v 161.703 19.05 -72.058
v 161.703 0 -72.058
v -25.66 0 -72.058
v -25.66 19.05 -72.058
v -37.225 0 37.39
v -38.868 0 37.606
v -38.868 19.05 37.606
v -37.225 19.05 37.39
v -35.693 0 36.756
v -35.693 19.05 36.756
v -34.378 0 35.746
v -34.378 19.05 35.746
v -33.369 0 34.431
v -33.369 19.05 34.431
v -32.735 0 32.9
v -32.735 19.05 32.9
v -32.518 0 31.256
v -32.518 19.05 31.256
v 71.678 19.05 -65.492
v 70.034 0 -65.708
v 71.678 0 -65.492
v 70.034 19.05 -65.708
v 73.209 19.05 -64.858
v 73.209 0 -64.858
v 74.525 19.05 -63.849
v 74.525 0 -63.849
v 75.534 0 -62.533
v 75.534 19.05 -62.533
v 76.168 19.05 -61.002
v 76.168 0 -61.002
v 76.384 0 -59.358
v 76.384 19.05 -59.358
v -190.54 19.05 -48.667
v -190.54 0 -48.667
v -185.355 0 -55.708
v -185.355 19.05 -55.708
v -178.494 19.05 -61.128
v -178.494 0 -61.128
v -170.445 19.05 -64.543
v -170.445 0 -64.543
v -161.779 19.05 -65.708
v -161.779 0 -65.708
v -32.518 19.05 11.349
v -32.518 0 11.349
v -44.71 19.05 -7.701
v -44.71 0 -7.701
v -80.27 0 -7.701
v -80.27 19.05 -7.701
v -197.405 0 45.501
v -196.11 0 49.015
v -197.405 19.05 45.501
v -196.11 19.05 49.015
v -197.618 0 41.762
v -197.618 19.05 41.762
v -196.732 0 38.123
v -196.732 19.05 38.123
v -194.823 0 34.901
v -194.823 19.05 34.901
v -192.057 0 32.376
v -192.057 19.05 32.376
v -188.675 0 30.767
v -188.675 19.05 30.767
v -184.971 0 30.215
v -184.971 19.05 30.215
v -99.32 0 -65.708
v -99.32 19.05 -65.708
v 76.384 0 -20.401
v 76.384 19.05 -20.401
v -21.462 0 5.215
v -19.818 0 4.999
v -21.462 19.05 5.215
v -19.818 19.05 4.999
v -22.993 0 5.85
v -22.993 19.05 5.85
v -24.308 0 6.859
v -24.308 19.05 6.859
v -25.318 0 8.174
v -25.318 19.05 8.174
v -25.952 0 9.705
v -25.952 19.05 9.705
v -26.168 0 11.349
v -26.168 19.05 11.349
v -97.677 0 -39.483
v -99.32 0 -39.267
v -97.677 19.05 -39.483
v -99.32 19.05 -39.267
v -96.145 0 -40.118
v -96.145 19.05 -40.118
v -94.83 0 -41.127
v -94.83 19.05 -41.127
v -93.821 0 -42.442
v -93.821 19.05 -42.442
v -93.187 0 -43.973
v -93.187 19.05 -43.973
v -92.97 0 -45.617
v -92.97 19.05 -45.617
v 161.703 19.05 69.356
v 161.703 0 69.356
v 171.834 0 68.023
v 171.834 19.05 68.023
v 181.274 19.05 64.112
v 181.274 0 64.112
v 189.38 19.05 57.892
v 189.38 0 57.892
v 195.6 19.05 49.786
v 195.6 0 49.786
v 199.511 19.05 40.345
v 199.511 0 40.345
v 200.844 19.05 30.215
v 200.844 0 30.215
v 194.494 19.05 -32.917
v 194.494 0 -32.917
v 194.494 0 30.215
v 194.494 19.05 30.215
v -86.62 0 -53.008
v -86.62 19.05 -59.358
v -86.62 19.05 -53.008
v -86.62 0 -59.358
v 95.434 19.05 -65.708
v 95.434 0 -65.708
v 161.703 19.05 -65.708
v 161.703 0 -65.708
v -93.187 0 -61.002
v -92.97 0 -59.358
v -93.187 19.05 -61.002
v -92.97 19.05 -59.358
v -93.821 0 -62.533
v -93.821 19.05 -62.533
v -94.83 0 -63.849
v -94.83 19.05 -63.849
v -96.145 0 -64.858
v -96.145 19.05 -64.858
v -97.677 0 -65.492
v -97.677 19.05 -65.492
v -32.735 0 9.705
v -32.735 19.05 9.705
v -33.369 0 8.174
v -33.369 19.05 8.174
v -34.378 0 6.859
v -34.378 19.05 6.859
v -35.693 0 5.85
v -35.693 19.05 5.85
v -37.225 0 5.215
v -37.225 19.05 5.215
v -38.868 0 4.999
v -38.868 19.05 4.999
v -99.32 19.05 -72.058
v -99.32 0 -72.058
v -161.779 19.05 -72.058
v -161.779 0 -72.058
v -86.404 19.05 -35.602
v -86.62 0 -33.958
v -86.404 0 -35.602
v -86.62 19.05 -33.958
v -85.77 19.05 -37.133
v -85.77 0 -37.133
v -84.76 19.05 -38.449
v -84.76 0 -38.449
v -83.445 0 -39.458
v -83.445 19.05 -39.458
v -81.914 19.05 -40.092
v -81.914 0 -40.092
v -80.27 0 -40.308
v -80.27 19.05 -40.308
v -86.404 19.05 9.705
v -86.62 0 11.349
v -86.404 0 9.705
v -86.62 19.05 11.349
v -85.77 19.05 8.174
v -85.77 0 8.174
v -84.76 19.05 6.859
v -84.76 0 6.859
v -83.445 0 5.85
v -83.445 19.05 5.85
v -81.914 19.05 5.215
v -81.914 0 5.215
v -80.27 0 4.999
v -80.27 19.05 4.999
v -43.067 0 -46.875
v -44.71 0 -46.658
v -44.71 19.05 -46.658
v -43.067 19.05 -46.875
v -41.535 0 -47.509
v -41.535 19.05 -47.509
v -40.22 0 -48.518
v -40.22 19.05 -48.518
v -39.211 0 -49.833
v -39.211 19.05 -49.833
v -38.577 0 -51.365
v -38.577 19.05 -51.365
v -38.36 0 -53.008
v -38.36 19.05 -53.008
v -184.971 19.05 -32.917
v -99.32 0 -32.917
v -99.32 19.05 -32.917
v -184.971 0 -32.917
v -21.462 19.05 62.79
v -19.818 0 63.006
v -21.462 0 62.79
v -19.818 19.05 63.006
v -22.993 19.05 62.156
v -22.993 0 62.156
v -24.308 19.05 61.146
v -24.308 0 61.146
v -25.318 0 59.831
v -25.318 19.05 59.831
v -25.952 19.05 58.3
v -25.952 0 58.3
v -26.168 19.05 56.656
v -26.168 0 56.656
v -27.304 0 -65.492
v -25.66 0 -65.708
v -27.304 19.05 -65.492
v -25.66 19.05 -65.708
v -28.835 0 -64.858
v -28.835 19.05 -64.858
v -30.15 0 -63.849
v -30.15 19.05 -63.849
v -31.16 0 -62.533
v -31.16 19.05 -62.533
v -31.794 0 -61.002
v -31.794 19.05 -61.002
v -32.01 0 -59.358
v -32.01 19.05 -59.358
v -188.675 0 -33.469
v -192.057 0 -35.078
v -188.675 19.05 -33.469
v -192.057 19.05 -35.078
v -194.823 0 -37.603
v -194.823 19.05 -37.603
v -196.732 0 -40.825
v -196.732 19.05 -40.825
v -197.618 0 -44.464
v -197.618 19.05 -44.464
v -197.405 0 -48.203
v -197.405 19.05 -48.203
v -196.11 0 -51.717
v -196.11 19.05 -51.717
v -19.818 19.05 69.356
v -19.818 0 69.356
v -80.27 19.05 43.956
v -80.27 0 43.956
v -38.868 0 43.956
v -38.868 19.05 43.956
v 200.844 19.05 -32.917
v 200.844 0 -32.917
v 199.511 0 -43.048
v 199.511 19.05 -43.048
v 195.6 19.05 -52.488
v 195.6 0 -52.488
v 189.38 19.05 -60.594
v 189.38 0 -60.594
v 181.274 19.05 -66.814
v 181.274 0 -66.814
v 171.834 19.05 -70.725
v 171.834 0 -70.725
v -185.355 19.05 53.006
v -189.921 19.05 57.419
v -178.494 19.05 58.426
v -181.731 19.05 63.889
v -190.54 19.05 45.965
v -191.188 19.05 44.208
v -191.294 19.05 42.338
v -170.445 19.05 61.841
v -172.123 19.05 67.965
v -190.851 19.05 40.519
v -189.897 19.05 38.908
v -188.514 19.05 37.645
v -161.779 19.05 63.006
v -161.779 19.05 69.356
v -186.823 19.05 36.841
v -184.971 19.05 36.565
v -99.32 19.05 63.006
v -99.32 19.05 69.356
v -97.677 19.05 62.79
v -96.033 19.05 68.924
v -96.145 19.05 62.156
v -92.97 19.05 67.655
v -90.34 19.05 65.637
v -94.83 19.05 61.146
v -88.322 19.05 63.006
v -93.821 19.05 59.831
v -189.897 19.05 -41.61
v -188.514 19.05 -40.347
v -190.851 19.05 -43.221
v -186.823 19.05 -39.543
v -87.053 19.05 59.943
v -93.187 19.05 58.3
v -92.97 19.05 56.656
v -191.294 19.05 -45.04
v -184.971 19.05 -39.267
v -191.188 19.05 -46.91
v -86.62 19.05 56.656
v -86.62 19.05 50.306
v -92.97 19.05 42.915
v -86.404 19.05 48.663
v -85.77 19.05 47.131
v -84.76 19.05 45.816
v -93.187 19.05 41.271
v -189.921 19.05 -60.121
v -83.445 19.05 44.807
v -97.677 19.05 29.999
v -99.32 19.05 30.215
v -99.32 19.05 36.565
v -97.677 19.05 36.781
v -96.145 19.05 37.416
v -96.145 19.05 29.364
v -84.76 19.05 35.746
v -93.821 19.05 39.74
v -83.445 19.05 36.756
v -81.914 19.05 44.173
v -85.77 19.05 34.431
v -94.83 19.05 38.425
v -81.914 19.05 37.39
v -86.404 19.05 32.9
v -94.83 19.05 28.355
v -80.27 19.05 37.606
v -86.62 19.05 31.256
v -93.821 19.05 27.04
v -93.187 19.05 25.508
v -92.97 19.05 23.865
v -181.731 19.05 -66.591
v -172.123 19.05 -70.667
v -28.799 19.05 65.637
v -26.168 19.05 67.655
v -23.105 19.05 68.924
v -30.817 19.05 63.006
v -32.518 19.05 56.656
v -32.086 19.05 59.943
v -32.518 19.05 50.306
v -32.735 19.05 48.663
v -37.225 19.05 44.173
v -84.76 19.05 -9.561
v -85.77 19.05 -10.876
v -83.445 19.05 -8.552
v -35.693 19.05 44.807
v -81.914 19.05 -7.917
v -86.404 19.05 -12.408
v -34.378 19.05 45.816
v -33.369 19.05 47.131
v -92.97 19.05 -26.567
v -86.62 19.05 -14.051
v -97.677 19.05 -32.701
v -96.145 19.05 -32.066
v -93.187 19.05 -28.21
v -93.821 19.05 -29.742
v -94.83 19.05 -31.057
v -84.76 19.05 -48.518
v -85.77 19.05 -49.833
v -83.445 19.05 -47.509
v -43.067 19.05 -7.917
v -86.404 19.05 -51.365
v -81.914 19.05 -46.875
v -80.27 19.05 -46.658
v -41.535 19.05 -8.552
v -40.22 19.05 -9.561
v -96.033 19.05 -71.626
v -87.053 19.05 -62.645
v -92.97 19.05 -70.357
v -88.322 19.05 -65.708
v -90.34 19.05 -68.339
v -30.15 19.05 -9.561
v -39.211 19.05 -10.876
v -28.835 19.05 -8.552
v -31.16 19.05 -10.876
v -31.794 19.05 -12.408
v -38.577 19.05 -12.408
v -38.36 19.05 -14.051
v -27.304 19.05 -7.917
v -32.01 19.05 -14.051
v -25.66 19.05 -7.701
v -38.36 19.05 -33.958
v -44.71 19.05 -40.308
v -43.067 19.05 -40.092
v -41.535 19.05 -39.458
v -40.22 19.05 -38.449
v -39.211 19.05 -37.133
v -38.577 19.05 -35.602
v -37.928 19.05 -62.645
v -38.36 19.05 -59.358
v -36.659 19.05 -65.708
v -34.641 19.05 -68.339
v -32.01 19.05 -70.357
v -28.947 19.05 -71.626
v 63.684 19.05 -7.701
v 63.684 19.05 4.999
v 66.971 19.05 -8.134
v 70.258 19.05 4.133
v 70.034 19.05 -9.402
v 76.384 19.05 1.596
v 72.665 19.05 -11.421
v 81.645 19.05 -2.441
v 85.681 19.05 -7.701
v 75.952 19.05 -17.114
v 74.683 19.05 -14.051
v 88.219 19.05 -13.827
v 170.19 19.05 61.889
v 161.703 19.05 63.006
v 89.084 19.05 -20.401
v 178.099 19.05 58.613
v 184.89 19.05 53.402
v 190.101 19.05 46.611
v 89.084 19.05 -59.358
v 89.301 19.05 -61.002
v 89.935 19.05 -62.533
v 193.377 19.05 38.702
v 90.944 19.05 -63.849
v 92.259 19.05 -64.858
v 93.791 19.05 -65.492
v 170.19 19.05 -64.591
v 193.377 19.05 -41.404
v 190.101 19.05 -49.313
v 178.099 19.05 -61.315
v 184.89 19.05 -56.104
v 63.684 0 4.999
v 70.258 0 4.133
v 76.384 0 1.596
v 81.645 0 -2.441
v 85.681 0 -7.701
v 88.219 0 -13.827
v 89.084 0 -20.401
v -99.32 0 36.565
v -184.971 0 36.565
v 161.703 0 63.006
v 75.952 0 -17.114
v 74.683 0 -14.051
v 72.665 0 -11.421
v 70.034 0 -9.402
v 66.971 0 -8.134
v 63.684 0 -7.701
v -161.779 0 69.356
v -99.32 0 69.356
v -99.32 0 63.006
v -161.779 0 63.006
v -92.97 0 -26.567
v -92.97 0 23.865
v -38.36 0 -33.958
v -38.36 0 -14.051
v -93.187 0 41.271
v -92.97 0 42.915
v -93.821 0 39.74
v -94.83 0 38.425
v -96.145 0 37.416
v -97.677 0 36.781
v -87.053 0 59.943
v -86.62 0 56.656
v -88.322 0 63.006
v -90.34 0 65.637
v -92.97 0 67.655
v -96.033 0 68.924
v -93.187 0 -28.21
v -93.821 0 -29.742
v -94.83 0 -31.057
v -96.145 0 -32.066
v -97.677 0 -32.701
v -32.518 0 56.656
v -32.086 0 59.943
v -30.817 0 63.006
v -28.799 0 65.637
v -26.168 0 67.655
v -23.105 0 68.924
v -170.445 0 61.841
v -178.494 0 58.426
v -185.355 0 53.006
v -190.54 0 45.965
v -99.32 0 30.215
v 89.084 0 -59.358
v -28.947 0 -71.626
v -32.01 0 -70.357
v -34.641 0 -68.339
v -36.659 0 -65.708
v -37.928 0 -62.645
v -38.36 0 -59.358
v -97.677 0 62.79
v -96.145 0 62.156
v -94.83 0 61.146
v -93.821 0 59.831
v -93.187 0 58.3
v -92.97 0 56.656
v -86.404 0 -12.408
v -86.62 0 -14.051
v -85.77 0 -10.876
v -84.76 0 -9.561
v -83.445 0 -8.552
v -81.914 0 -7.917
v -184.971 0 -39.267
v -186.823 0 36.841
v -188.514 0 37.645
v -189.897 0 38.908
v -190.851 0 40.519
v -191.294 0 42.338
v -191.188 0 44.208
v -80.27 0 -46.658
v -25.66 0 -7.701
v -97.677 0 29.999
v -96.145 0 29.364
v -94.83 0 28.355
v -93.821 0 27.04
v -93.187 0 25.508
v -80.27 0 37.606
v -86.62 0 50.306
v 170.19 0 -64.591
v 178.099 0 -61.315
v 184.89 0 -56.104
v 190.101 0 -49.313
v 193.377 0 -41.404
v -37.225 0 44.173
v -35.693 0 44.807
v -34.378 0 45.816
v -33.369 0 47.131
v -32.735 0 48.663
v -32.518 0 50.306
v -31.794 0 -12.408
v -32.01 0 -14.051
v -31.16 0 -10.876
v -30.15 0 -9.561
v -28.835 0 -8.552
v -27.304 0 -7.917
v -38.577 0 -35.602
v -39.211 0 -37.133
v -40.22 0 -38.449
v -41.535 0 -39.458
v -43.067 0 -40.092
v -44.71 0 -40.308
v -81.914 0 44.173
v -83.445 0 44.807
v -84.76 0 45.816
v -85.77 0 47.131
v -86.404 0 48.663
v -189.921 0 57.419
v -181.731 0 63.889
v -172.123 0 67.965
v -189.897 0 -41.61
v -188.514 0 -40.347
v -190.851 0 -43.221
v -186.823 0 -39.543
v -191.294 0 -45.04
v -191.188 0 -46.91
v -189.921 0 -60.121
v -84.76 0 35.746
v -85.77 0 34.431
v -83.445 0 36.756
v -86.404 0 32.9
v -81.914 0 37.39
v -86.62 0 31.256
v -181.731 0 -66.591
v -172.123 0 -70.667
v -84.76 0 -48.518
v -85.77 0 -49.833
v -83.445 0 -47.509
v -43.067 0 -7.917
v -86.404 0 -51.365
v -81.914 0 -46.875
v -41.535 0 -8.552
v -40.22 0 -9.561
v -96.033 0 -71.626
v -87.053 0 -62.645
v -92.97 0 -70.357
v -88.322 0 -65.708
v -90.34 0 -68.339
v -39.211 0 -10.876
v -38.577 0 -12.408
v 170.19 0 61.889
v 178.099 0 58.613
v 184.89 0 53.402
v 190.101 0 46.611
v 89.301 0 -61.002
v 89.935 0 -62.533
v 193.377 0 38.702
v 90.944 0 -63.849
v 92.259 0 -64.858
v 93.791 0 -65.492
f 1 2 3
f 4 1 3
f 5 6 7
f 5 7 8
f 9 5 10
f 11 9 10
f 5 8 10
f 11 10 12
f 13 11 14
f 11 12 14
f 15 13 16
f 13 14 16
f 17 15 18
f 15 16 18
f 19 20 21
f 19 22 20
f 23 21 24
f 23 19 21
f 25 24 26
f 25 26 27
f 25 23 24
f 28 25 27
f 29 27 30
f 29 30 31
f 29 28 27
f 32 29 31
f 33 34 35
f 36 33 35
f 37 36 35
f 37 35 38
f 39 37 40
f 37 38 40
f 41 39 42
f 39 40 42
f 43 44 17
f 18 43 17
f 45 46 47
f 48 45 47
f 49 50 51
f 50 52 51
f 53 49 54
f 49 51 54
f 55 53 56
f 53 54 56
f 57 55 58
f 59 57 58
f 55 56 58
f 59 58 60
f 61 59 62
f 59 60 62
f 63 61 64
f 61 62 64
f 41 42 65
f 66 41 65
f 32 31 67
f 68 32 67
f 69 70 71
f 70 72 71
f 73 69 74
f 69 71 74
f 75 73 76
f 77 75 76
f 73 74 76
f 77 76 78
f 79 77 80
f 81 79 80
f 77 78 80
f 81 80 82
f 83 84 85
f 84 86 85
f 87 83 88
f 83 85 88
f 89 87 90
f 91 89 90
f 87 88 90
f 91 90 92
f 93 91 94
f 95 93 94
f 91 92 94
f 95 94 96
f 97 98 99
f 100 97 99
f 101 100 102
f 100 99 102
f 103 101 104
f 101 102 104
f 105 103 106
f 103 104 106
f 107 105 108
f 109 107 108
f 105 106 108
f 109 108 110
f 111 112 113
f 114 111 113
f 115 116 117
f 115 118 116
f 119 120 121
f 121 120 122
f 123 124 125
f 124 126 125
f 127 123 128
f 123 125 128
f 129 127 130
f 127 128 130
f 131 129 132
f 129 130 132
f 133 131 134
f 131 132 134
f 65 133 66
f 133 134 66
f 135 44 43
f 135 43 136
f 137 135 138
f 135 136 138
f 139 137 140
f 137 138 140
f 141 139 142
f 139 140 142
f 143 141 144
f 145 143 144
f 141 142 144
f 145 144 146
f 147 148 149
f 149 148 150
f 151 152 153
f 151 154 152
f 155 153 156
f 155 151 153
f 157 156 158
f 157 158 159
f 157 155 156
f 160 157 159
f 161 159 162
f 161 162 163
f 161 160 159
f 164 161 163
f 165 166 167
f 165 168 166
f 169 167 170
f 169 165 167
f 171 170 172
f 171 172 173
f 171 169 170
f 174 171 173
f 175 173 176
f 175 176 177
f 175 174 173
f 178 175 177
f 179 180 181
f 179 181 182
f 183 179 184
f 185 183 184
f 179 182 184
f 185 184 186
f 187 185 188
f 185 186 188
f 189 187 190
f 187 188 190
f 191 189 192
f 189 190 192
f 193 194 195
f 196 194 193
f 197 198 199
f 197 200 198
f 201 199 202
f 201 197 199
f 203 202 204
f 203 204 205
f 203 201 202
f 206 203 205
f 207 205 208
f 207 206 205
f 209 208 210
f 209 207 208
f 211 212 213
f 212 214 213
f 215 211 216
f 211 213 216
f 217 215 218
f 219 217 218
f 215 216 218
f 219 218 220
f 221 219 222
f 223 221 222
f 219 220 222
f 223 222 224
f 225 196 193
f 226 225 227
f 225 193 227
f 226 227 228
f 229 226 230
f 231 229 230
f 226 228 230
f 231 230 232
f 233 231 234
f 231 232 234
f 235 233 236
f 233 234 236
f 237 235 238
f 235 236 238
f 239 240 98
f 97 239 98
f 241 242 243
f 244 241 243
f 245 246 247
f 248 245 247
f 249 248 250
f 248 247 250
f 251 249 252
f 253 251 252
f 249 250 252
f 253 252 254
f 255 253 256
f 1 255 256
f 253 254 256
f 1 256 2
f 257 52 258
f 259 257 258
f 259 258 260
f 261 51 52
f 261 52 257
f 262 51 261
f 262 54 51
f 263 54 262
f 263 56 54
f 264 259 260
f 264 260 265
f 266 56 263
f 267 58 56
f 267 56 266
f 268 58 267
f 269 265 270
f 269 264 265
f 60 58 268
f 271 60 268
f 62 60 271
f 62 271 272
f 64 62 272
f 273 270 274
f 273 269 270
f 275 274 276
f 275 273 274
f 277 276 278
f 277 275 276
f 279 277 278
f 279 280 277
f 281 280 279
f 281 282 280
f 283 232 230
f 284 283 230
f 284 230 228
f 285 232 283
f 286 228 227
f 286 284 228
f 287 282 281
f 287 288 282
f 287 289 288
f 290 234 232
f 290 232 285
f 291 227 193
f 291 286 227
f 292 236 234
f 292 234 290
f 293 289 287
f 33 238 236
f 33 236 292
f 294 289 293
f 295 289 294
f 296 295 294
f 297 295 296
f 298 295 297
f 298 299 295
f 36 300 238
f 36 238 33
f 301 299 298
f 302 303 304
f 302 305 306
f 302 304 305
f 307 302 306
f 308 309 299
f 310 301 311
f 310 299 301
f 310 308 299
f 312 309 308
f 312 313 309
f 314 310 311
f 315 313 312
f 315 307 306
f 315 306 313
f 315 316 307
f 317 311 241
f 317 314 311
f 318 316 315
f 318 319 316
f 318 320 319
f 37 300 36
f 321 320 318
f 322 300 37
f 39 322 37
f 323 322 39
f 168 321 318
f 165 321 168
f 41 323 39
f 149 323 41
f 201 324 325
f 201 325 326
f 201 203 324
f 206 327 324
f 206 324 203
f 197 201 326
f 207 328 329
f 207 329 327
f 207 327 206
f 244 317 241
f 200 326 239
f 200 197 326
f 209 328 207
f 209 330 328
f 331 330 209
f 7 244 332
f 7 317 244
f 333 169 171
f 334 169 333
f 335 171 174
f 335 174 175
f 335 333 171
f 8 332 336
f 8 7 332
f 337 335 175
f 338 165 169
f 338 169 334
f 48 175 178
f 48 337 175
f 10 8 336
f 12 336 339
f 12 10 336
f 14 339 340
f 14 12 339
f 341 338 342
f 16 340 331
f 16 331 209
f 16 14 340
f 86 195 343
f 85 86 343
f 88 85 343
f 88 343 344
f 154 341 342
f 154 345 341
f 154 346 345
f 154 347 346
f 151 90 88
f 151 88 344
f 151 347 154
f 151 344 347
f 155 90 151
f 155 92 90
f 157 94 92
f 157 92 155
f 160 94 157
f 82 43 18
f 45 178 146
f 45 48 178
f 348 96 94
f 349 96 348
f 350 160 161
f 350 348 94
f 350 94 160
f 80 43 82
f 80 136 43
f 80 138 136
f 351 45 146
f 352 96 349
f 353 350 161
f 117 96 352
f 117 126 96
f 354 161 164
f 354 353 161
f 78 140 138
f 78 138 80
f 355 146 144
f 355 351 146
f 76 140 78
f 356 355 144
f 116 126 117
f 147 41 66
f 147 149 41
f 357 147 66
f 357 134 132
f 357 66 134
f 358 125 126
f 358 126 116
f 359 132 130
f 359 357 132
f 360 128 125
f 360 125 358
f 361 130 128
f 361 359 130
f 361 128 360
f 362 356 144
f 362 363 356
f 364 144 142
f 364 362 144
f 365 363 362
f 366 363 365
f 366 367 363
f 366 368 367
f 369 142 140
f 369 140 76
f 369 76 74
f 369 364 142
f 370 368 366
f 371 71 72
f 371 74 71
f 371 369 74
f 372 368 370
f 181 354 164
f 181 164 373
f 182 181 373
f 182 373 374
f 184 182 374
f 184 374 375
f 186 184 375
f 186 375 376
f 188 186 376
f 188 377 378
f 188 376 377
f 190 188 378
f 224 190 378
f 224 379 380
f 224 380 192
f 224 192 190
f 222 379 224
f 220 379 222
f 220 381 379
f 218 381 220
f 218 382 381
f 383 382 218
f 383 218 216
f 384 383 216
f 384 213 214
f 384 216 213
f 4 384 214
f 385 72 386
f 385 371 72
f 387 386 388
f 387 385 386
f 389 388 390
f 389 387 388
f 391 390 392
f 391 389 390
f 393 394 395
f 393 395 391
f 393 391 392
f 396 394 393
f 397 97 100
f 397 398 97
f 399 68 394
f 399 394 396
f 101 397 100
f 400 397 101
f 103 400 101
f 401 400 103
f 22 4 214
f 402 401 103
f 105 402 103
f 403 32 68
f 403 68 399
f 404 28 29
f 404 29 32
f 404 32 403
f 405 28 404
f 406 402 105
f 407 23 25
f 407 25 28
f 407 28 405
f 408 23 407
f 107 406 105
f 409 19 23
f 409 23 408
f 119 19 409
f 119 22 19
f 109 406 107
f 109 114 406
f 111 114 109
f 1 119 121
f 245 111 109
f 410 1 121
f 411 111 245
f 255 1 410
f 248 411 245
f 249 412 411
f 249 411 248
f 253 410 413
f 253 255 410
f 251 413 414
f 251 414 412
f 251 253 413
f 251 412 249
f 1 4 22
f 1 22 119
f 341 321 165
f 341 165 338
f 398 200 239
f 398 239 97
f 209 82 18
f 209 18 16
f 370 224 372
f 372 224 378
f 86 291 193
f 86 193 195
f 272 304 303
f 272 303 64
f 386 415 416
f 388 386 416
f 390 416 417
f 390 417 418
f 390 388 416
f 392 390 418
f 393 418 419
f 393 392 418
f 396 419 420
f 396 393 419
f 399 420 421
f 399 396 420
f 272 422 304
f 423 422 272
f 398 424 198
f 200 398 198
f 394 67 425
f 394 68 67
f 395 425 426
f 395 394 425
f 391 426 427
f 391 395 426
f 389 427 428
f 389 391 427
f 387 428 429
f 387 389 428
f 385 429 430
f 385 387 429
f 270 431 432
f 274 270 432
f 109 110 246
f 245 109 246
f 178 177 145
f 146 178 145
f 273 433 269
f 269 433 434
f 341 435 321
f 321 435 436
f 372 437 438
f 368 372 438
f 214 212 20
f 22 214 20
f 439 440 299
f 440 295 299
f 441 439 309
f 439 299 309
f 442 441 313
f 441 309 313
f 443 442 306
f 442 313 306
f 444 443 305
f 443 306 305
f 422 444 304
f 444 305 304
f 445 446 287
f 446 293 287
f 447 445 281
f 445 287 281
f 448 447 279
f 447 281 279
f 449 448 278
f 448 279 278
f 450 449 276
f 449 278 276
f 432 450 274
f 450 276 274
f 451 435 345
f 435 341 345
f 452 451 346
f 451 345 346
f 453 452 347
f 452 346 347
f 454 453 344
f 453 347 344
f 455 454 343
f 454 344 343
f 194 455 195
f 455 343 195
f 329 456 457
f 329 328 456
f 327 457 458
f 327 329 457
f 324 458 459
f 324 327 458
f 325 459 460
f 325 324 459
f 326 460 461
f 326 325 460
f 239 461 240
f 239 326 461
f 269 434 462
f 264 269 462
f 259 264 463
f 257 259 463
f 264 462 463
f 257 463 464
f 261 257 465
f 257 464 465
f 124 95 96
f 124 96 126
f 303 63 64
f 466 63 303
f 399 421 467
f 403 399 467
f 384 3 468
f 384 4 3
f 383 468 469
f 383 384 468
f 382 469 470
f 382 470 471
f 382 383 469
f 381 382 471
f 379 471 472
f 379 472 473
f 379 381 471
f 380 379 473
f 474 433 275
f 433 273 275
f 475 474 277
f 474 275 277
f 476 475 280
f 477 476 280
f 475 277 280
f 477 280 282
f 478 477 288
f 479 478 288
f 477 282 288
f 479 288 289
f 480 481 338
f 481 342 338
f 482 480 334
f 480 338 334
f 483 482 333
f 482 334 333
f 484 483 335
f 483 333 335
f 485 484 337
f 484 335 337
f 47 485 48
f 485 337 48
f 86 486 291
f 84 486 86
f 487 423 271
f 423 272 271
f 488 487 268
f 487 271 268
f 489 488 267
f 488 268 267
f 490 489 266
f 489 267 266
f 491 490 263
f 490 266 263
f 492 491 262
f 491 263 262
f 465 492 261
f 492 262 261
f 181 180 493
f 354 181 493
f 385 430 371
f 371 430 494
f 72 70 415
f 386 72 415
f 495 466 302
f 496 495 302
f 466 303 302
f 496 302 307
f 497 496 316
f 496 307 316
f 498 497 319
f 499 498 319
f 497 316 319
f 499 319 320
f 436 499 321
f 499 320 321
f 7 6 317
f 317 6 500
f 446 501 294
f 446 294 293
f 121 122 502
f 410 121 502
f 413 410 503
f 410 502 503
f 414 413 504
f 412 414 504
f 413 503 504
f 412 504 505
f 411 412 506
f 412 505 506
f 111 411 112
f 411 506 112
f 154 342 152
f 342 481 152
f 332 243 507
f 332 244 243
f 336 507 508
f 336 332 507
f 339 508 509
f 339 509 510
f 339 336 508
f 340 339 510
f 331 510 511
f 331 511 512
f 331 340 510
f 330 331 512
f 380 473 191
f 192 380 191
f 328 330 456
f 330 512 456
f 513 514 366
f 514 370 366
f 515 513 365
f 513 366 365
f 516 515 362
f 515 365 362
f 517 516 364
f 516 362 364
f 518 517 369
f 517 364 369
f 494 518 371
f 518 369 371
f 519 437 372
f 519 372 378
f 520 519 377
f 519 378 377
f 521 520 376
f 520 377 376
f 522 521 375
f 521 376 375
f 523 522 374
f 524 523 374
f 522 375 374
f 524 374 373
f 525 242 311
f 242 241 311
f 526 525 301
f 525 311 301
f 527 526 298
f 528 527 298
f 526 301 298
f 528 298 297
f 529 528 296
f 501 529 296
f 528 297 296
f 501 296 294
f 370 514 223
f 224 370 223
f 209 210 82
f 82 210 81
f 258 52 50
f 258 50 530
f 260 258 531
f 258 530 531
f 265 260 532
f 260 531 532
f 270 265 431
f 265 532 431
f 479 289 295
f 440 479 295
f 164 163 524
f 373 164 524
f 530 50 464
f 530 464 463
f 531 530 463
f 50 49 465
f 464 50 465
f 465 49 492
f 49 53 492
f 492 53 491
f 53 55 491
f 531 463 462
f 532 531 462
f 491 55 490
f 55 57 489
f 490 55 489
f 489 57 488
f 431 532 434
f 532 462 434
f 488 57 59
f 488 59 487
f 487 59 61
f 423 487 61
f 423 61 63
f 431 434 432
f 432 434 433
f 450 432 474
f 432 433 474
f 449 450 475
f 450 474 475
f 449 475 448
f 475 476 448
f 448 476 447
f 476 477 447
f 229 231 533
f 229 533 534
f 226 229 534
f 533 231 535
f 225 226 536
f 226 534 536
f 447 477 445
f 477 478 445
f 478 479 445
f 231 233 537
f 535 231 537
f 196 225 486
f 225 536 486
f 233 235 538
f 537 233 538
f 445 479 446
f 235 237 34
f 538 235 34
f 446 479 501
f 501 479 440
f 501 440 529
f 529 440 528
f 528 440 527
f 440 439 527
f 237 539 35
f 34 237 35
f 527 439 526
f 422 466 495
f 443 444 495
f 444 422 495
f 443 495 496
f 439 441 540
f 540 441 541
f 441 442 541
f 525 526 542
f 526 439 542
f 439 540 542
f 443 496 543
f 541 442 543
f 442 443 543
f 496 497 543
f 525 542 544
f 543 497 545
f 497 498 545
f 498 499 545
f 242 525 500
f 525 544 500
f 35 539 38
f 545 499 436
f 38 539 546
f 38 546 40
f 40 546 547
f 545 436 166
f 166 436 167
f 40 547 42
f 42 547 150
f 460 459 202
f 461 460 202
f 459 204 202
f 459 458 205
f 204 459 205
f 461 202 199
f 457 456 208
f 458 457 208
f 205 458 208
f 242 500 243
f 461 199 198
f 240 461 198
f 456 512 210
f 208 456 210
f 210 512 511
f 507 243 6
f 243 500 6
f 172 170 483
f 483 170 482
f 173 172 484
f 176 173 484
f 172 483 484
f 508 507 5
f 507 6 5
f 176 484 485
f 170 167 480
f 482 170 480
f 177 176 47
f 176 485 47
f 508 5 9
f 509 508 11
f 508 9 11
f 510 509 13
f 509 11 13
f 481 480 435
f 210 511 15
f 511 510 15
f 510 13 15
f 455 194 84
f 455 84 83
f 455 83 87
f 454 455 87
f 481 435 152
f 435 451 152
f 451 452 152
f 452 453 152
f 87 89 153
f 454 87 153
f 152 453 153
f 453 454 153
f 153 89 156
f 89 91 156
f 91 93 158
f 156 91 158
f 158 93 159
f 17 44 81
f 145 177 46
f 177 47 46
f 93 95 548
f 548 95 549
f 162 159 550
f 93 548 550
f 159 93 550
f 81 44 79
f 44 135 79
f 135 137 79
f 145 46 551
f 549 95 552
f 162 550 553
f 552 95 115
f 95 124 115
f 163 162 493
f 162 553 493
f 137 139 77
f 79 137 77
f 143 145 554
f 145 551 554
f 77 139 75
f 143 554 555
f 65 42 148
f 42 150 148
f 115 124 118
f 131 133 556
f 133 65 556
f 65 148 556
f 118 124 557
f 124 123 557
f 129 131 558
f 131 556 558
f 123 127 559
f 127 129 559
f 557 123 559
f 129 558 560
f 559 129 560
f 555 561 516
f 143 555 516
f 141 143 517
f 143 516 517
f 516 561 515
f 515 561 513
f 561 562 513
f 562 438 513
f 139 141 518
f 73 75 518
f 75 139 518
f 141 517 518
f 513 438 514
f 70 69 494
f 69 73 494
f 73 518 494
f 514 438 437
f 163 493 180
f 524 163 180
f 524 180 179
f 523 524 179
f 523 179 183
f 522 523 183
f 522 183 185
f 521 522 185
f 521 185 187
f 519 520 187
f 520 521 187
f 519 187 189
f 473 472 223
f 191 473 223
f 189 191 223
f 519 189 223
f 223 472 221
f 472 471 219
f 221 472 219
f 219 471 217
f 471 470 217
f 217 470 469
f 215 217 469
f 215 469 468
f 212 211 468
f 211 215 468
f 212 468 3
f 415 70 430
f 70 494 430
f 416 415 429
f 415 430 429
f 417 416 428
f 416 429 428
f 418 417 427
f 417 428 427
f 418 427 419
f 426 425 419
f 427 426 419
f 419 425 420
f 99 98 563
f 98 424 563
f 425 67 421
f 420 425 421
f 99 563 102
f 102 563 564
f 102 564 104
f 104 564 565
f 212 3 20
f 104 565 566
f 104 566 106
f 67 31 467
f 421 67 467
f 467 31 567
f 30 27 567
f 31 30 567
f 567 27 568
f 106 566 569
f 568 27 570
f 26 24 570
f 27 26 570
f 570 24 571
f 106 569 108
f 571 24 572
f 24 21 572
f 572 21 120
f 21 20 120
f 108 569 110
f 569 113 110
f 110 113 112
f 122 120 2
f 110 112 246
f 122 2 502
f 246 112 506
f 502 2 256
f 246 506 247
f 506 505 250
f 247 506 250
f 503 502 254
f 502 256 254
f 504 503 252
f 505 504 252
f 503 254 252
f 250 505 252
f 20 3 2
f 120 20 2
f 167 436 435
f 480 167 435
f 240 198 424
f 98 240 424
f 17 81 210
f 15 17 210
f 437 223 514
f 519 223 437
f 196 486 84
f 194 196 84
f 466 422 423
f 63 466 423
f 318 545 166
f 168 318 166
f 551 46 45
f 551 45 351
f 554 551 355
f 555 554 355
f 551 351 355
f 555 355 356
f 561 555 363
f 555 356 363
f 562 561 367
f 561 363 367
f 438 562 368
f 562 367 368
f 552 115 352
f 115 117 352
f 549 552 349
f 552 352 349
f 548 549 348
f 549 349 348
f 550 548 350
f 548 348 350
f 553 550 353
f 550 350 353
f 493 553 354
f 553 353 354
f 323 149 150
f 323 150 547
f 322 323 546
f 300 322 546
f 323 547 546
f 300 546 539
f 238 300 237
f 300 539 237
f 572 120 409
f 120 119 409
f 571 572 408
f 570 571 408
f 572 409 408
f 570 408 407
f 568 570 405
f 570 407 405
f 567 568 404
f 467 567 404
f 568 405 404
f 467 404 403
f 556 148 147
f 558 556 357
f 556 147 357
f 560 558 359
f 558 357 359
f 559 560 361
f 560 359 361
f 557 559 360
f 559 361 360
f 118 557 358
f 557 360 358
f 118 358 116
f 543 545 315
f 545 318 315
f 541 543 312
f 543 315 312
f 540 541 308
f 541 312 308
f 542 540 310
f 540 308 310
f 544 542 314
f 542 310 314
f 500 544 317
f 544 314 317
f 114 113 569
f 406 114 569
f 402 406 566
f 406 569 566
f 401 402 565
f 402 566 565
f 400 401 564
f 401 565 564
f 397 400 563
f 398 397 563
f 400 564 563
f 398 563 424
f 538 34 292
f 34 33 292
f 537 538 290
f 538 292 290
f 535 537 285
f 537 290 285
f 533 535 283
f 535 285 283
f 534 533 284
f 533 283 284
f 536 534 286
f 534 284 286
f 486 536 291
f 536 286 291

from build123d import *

# Parameters (mm, degrees)
BOSS_EXTRUDE1_DEPTH   = 19.05
BOSS_EXTRUDE1_2_DEPTH = 19.05
SKETCH4_W             = 6.35
SKETCH4_H             = 63.131908364
CUT_EXTRUDE4_DEPTH    = 19.05
BOSS_EXTRUDE2_DEPTH   = 19.05
BOSS_EXTRUDE3_DEPTH   = 19.05
FILLET2_R             = 6.35
FILLET3_R             = 12.7
FILLET4_R             = 12.7
FILLET5_R             = 25.4


with BuildPart() as part:
    # Sketch1 → Boss-Extrude1 (new body)
    with BuildSketch(Plane(origin=(0, 0, 0), x_dir=(1, 0, 0), z_dir=(0, 1, 0))):
        with BuildLine():
            Line((-200.920268311, 32.916976578), (-200.920268311, -30.214931786))
            ThreePointArc((-200.920268311, -30.214931786), (-189.456017676, -57.892081151), (-161.778868311, -69.356331786))
            Line((-161.778868311, -69.356331786), (-86.620268311, -69.356331786))
            Line((-86.620268311, -69.356331786), (-86.620268311, -63.006331786))
            Line((-86.620268311, -63.006331786), (-161.778868311, -63.006331786))
            ThreePointArc((-161.778868311, -63.006331786), (-184.965889616, -53.401953091), (-194.570268311, -30.214931786))
            Line((-194.570268311, -30.214931786), (-194.570268311, 32.916976578))
            ThreePointArc((-194.570268311, 32.916976578), (-184.965889616, 56.103997883), (-161.778868311, 65.708376578))
            Line((-161.778868311, 65.708376578), (-86.620268311, 65.708376578))
            Line((-86.620268311, 65.708376578), (-86.620268311, 72.058376578))
            Line((-86.620268311, 72.058376578), (-161.778868311, 72.058376578))
            ThreePointArc((-161.778868311, 72.058376578), (-189.456017676, 60.594125943), (-200.920268311, 32.916976578))
        make_face()
    extrude(amount=BOSS_EXTRUDE1_DEPTH)

    # Sketch4 → Cut-Extrude4 (cut)
    with BuildSketch(Plane(origin=(0, 19.05, 0), x_dir=(1, 0, 0), z_dir=(0, 1, 0))):
        with Locations((-197.745268311, 1.351022396)):
            Rectangle(SKETCH4_W, SKETCH4_H)
    extrude(amount=-CUT_EXTRUDE4_DEPTH, mode=Mode.SUBTRACT)

    # Sketch5 → Boss-Extrude2 (add)
    with BuildSketch(Plane(origin=(0, 0, 0), x_dir=(1, 0, 0), z_dir=(0, 1, 0))):
        with BuildLine():
            Line((-194.570268311, -30.214931786), (-86.620268311, -30.214931786))
            Line((-86.620268311, -30.214931786), (-86.620268311, -63.006331786))
            Line((-86.620268311, -63.006331786), (-92.970268311, -63.006331786))
            Line((-92.970268311, -63.006331786), (-92.970268311, -36.564931786))
            Line((-92.970268311, -36.564931786), (-193.949560159, -36.564931786))
            ThreePointArc((-193.949560159, -36.564931786), (-194.414722357, -33.405064174), (-194.570268311, -30.214931786))
        make_face()
        with BuildLine():
            Line((-92.970268311, 65.708376578), (-86.620268311, 65.708376578))
            Line((-86.620268311, 65.708376578), (-86.620268311, 32.916976578))
            Line((-86.620268311, 32.916976578), (-194.570268311, 32.916976578))
            ThreePointArc((-194.570268311, 32.916976578), (-194.414722357, 36.107108966), (-193.949560159, 39.266976578))
            Line((-193.949560159, 39.266976578), (-92.970268311, 39.266976578))
            Line((-92.970268311, 39.266976578), (-92.970268311, 65.708376578))
        make_face()
    extrude(amount=BOSS_EXTRUDE2_DEPTH)



with BuildPart() as body_2:
    # Sketch1 → Boss-Extrude1 2 (new body)
    with BuildSketch(Plane(origin=(0, 0, 0), x_dir=(1, 0, 0), z_dir=(0, 1, 0))):
        with BuildLine():
            Line((200.844440053, -30.214931786), (200.844440053, 32.916976578))
            ThreePointArc((200.844440053, 32.916976578), (189.380189418, 60.594125943), (161.703040053, 72.058376578))
            Line((161.703040053, 72.058376578), (-38.360268311, 72.058376578))
            Line((-38.360268311, 72.058376578), (-38.360268311, 65.708376578))
            Line((-38.360268311, 65.708376578), (161.703040053, 65.708376578))
            ThreePointArc((161.703040053, 65.708376578), (184.890061358, 56.103997883), (194.494440053, 32.916976578))
            Line((194.494440053, 32.916976578), (194.494440053, -30.214931786))
            ThreePointArc((194.494440053, -30.214931786), (184.890061358, -53.401953091), (161.703040053, -63.006331786))
            Line((161.703040053, -63.006331786), (-32.518268311, -63.006331786))
            Line((-32.518268311, -63.006331786), (-32.518268311, -69.356331786))
            Line((-32.518268311, -69.356331786), (161.703040053, -69.356331786))
            ThreePointArc((161.703040053, -69.356331786), (189.380189418, -57.892081151), (200.844440053, -30.214931786))
        make_face()
    extrude(amount=BOSS_EXTRUDE1_2_DEPTH)


with BuildPart() as part_1:
    add(part.part)

    add(body_2.part)  # Boss-Extrude3 merges body 2
    # Sketch6 → Boss-Extrude3 (add)
    with BuildSketch(Plane(origin=(0, 0, 0), x_dir=(1, 0, 0), z_dir=(0, 1, 0))):
        Polygon((-86.620268311, -43.956331786), (-32.518268311, -43.956331786), (-32.518268311, -63.006331786), (-26.168268311, -63.006331786), (-26.168268311, -37.606331786), (-26.168268311, -4.998977604), (89.084440053, -4.998977604), (89.084440053, 65.708376578), (76.384440053, 65.708376578), (76.384440053, 7.701022396), (-32.010268311, 7.701022396), (-32.010268311, 40.308376578), (-32.010268311, 65.708376578), (-38.360268311, 65.708376578), (-38.360268311, 46.658376578), (-86.620268311, 46.658376578), (-86.620268311, 40.308376578), (-38.360268311, 40.308376578), (-38.360268311, 7.701022396), (-86.620268311, 7.701022396), (-86.620268311, 32.916976578), (-92.970268311, 32.916976578), (-92.970268311, 7.701022396), (-92.970268311, -4.998977604), (-92.970268311, -30.214931786), (-86.620268311, -30.214931786), (-86.620268311, -4.998977604), (-32.518268311, -4.998977604), (-32.518268311, -37.606331786), (-86.620268311, -37.606331786), align=None)
    extrude(amount=BOSS_EXTRUDE3_DEPTH)

    # Fillet2
    fillet2_edges = [part_1.edges().sort_by_distance(p)[0] for p in [
        (-193.949560159, 9.525, 36.564931786),
        (-92.970268311, 9.525, 36.564931786),
        (-193.949560159, 9.525, -39.266976578),
        (-92.970268311, 9.525, -65.708376578),
        (-92.970268311, 9.525, -39.266976578),
        (-86.620268311, 9.525, 37.606331786),
        (-86.620268311, 9.525, 43.956331786),
        (-32.518268311, 9.525, 43.956331786),
        (-26.168268311, 9.525, 63.006331786),
        (-26.168268311, 9.525, 4.998977604),
        (89.084440053, 9.525, -65.708376578),
        (76.384440053, 9.525, -65.708376578),
        (-32.010268311, 9.525, -7.701022396),
        (-32.010268311, 9.525, -65.708376578),
        (-38.360268311, 9.525, -46.658376578),
        (-86.620268311, 9.525, -46.658376578),
        (-86.620268311, 9.525, -40.308376578),
        (-38.360268311, 9.525, -40.308376578),
        (-38.360268311, 9.525, -7.701022396),
        (-86.620268311, 9.525, -7.701022396),
        (-92.970268311, 9.525, -32.916976578),
        (-92.970268311, 9.525, 30.214931786),
        (-86.620268311, 9.525, 4.998977604),
        (-32.518268311, 9.525, 4.998977604),
        (-32.518268311, 9.525, 37.606331786),
        (-92.970268311, 9.525, 63.006331786),
    ]]
    fillet(fillet2_edges, radius=FILLET2_R)

    # Fillet3
    fillet3_edges = [part_1.edges().sort_by_distance(p)[0] for p in [
        (-200.920268311, 9.525, 30.214931786),
        (-200.920268311, 9.525, -32.916976578),
        (-86.620268311, 9.525, -72.058376578),
        (-32.518268311, 9.525, 69.356331786),
        (-38.360268311, 9.525, -72.058376578),
        (-86.620268311, 9.525, 69.356331786),
    ]]
    fillet(fillet3_edges, radius=FILLET3_R)

    # Fillet4
    fillet4_edges = [part_1.edges().sort_by_distance(p)[0] for p in [
        (76.384440053, 9.525, -7.701022396),
    ]]
    fillet(fillet4_edges, radius=FILLET4_R)

    # Fillet5
    fillet5_edges = [part_1.edges().sort_by_distance(p)[0] for p in [
        (89.084440053, 9.525, 4.998977604),
    ]]
    fillet(fillet5_edges, radius=FILLET5_R)


solid = part_1.part
